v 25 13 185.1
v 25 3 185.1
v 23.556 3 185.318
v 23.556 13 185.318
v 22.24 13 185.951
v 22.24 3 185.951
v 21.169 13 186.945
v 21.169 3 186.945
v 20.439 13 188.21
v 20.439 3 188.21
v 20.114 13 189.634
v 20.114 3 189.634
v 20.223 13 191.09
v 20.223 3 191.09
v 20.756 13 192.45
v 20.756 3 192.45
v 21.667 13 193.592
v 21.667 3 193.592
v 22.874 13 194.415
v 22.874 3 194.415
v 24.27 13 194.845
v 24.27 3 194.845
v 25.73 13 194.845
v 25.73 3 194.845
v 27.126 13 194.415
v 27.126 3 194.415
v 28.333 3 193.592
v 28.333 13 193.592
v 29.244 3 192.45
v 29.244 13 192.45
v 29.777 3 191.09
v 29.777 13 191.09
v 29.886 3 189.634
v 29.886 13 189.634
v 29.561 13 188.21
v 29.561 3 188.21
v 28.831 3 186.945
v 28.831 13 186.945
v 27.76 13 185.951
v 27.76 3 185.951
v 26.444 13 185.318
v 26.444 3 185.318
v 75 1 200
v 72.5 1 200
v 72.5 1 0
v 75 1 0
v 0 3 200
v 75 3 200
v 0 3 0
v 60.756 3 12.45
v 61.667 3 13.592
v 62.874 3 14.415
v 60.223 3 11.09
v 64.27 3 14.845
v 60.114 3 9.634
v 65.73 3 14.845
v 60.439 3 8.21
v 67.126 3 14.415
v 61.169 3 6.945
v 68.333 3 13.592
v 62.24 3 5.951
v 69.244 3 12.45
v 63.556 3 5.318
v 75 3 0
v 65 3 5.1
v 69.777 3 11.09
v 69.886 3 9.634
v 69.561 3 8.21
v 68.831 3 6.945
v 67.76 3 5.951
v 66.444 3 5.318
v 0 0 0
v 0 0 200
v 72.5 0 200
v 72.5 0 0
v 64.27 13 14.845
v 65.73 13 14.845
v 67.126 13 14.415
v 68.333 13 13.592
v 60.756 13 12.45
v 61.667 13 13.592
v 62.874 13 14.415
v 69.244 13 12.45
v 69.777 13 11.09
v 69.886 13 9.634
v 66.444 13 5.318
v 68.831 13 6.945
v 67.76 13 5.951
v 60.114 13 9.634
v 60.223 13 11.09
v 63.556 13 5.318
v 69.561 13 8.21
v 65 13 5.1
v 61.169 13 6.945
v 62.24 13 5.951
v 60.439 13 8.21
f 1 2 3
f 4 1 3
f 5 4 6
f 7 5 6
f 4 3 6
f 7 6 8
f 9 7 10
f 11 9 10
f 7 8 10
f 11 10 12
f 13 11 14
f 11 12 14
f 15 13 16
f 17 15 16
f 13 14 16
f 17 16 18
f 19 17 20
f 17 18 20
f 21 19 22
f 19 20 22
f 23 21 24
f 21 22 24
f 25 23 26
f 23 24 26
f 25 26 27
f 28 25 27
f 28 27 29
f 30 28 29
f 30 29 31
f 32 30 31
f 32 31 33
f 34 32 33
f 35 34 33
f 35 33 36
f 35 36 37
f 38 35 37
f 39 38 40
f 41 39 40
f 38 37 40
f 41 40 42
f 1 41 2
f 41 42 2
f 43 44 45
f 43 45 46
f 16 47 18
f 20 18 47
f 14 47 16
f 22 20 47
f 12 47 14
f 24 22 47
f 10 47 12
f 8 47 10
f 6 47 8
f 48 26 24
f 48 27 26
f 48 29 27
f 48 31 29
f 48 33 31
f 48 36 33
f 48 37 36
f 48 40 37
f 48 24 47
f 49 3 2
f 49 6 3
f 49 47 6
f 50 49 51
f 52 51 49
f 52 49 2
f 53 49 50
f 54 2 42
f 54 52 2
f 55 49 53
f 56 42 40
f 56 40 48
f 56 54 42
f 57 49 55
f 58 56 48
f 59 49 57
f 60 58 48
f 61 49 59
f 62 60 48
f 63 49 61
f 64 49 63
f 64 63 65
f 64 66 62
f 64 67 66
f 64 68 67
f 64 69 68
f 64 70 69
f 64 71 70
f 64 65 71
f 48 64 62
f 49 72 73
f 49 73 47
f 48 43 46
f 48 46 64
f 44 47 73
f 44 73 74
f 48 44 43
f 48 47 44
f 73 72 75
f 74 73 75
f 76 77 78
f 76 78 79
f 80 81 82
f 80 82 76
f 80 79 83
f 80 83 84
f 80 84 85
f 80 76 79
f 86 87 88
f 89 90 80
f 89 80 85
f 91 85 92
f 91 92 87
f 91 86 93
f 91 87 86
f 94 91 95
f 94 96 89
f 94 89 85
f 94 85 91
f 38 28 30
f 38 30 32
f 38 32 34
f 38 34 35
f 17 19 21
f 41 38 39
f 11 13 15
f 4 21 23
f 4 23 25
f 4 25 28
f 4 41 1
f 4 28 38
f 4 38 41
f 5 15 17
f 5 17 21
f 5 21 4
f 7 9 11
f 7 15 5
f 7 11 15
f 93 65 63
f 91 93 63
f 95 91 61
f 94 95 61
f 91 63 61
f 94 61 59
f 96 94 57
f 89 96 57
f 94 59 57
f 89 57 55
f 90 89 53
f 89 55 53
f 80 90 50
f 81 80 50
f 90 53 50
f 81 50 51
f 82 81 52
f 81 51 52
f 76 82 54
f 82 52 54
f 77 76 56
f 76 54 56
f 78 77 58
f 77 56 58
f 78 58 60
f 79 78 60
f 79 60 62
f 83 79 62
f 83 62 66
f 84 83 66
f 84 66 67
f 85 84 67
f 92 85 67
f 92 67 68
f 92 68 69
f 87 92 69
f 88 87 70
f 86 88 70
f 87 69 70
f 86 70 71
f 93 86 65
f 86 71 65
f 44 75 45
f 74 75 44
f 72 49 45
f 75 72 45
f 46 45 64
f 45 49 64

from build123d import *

# Parameters (mm, degrees)
SKETCH1_W           = 75
SKETCH1_H           = 3
BOSS_EXTRUDE1_DEPTH = 200
SKETCH2_R           = 4.9
BOSS_EXTRUDE2_DEPTH = 10
SKETCH5_W           = 2.5
SKETCH5_H           = 200
CUT_EXTRUDE2_DEPTH  = 1


with BuildPart() as part:
    # Sketch1 → Boss-Extrude1 (new body)
    with BuildSketch(Plane.XY):
        with Locations((37.5, 1.5)):
            Rectangle(SKETCH1_W, SKETCH1_H)
    extrude(amount=BOSS_EXTRUDE1_DEPTH)

    # Sketch2 → Boss-Extrude2 (add)
    with BuildSketch(Plane(origin=(0, 3, 0), x_dir=(1, 0, 0), z_dir=(0, 1, 0))):
        with Locations(Location((25, -190, 0), (0, 0, 90))):
            Circle(SKETCH2_R)
        with Locations(Location((65, -10, 0), (0, 0, 90))):
            Circle(SKETCH2_R)
        with Locations((165, -190)):
            Circle(SKETCH2_R)
        with Locations((85, -190)):
            Circle(SKETCH2_R)
        with Locations((-27.5, -10)):
            Circle(SKETCH2_R)
    extrude(amount=BOSS_EXTRUDE2_DEPTH)


with BuildPart() as boss_extrude2_kept_piece:
    # of the separate pieces the step leaves, the one the design keeps (boss_extrude2_pieces_kept)
    add(part.part.solids().sort_by_distance((0, 0, 0))[0])

    # Sketch5 → Cut-Extrude2 (cut)
    with BuildSketch(Plane.XZ):
        with Locations((73.75, 100)):
            Rectangle(SKETCH5_W, SKETCH5_H)
    extrude(amount=-CUT_EXTRUDE2_DEPTH, mode=Mode.SUBTRACT)


solid = boss_extrude2_kept_piece.part
